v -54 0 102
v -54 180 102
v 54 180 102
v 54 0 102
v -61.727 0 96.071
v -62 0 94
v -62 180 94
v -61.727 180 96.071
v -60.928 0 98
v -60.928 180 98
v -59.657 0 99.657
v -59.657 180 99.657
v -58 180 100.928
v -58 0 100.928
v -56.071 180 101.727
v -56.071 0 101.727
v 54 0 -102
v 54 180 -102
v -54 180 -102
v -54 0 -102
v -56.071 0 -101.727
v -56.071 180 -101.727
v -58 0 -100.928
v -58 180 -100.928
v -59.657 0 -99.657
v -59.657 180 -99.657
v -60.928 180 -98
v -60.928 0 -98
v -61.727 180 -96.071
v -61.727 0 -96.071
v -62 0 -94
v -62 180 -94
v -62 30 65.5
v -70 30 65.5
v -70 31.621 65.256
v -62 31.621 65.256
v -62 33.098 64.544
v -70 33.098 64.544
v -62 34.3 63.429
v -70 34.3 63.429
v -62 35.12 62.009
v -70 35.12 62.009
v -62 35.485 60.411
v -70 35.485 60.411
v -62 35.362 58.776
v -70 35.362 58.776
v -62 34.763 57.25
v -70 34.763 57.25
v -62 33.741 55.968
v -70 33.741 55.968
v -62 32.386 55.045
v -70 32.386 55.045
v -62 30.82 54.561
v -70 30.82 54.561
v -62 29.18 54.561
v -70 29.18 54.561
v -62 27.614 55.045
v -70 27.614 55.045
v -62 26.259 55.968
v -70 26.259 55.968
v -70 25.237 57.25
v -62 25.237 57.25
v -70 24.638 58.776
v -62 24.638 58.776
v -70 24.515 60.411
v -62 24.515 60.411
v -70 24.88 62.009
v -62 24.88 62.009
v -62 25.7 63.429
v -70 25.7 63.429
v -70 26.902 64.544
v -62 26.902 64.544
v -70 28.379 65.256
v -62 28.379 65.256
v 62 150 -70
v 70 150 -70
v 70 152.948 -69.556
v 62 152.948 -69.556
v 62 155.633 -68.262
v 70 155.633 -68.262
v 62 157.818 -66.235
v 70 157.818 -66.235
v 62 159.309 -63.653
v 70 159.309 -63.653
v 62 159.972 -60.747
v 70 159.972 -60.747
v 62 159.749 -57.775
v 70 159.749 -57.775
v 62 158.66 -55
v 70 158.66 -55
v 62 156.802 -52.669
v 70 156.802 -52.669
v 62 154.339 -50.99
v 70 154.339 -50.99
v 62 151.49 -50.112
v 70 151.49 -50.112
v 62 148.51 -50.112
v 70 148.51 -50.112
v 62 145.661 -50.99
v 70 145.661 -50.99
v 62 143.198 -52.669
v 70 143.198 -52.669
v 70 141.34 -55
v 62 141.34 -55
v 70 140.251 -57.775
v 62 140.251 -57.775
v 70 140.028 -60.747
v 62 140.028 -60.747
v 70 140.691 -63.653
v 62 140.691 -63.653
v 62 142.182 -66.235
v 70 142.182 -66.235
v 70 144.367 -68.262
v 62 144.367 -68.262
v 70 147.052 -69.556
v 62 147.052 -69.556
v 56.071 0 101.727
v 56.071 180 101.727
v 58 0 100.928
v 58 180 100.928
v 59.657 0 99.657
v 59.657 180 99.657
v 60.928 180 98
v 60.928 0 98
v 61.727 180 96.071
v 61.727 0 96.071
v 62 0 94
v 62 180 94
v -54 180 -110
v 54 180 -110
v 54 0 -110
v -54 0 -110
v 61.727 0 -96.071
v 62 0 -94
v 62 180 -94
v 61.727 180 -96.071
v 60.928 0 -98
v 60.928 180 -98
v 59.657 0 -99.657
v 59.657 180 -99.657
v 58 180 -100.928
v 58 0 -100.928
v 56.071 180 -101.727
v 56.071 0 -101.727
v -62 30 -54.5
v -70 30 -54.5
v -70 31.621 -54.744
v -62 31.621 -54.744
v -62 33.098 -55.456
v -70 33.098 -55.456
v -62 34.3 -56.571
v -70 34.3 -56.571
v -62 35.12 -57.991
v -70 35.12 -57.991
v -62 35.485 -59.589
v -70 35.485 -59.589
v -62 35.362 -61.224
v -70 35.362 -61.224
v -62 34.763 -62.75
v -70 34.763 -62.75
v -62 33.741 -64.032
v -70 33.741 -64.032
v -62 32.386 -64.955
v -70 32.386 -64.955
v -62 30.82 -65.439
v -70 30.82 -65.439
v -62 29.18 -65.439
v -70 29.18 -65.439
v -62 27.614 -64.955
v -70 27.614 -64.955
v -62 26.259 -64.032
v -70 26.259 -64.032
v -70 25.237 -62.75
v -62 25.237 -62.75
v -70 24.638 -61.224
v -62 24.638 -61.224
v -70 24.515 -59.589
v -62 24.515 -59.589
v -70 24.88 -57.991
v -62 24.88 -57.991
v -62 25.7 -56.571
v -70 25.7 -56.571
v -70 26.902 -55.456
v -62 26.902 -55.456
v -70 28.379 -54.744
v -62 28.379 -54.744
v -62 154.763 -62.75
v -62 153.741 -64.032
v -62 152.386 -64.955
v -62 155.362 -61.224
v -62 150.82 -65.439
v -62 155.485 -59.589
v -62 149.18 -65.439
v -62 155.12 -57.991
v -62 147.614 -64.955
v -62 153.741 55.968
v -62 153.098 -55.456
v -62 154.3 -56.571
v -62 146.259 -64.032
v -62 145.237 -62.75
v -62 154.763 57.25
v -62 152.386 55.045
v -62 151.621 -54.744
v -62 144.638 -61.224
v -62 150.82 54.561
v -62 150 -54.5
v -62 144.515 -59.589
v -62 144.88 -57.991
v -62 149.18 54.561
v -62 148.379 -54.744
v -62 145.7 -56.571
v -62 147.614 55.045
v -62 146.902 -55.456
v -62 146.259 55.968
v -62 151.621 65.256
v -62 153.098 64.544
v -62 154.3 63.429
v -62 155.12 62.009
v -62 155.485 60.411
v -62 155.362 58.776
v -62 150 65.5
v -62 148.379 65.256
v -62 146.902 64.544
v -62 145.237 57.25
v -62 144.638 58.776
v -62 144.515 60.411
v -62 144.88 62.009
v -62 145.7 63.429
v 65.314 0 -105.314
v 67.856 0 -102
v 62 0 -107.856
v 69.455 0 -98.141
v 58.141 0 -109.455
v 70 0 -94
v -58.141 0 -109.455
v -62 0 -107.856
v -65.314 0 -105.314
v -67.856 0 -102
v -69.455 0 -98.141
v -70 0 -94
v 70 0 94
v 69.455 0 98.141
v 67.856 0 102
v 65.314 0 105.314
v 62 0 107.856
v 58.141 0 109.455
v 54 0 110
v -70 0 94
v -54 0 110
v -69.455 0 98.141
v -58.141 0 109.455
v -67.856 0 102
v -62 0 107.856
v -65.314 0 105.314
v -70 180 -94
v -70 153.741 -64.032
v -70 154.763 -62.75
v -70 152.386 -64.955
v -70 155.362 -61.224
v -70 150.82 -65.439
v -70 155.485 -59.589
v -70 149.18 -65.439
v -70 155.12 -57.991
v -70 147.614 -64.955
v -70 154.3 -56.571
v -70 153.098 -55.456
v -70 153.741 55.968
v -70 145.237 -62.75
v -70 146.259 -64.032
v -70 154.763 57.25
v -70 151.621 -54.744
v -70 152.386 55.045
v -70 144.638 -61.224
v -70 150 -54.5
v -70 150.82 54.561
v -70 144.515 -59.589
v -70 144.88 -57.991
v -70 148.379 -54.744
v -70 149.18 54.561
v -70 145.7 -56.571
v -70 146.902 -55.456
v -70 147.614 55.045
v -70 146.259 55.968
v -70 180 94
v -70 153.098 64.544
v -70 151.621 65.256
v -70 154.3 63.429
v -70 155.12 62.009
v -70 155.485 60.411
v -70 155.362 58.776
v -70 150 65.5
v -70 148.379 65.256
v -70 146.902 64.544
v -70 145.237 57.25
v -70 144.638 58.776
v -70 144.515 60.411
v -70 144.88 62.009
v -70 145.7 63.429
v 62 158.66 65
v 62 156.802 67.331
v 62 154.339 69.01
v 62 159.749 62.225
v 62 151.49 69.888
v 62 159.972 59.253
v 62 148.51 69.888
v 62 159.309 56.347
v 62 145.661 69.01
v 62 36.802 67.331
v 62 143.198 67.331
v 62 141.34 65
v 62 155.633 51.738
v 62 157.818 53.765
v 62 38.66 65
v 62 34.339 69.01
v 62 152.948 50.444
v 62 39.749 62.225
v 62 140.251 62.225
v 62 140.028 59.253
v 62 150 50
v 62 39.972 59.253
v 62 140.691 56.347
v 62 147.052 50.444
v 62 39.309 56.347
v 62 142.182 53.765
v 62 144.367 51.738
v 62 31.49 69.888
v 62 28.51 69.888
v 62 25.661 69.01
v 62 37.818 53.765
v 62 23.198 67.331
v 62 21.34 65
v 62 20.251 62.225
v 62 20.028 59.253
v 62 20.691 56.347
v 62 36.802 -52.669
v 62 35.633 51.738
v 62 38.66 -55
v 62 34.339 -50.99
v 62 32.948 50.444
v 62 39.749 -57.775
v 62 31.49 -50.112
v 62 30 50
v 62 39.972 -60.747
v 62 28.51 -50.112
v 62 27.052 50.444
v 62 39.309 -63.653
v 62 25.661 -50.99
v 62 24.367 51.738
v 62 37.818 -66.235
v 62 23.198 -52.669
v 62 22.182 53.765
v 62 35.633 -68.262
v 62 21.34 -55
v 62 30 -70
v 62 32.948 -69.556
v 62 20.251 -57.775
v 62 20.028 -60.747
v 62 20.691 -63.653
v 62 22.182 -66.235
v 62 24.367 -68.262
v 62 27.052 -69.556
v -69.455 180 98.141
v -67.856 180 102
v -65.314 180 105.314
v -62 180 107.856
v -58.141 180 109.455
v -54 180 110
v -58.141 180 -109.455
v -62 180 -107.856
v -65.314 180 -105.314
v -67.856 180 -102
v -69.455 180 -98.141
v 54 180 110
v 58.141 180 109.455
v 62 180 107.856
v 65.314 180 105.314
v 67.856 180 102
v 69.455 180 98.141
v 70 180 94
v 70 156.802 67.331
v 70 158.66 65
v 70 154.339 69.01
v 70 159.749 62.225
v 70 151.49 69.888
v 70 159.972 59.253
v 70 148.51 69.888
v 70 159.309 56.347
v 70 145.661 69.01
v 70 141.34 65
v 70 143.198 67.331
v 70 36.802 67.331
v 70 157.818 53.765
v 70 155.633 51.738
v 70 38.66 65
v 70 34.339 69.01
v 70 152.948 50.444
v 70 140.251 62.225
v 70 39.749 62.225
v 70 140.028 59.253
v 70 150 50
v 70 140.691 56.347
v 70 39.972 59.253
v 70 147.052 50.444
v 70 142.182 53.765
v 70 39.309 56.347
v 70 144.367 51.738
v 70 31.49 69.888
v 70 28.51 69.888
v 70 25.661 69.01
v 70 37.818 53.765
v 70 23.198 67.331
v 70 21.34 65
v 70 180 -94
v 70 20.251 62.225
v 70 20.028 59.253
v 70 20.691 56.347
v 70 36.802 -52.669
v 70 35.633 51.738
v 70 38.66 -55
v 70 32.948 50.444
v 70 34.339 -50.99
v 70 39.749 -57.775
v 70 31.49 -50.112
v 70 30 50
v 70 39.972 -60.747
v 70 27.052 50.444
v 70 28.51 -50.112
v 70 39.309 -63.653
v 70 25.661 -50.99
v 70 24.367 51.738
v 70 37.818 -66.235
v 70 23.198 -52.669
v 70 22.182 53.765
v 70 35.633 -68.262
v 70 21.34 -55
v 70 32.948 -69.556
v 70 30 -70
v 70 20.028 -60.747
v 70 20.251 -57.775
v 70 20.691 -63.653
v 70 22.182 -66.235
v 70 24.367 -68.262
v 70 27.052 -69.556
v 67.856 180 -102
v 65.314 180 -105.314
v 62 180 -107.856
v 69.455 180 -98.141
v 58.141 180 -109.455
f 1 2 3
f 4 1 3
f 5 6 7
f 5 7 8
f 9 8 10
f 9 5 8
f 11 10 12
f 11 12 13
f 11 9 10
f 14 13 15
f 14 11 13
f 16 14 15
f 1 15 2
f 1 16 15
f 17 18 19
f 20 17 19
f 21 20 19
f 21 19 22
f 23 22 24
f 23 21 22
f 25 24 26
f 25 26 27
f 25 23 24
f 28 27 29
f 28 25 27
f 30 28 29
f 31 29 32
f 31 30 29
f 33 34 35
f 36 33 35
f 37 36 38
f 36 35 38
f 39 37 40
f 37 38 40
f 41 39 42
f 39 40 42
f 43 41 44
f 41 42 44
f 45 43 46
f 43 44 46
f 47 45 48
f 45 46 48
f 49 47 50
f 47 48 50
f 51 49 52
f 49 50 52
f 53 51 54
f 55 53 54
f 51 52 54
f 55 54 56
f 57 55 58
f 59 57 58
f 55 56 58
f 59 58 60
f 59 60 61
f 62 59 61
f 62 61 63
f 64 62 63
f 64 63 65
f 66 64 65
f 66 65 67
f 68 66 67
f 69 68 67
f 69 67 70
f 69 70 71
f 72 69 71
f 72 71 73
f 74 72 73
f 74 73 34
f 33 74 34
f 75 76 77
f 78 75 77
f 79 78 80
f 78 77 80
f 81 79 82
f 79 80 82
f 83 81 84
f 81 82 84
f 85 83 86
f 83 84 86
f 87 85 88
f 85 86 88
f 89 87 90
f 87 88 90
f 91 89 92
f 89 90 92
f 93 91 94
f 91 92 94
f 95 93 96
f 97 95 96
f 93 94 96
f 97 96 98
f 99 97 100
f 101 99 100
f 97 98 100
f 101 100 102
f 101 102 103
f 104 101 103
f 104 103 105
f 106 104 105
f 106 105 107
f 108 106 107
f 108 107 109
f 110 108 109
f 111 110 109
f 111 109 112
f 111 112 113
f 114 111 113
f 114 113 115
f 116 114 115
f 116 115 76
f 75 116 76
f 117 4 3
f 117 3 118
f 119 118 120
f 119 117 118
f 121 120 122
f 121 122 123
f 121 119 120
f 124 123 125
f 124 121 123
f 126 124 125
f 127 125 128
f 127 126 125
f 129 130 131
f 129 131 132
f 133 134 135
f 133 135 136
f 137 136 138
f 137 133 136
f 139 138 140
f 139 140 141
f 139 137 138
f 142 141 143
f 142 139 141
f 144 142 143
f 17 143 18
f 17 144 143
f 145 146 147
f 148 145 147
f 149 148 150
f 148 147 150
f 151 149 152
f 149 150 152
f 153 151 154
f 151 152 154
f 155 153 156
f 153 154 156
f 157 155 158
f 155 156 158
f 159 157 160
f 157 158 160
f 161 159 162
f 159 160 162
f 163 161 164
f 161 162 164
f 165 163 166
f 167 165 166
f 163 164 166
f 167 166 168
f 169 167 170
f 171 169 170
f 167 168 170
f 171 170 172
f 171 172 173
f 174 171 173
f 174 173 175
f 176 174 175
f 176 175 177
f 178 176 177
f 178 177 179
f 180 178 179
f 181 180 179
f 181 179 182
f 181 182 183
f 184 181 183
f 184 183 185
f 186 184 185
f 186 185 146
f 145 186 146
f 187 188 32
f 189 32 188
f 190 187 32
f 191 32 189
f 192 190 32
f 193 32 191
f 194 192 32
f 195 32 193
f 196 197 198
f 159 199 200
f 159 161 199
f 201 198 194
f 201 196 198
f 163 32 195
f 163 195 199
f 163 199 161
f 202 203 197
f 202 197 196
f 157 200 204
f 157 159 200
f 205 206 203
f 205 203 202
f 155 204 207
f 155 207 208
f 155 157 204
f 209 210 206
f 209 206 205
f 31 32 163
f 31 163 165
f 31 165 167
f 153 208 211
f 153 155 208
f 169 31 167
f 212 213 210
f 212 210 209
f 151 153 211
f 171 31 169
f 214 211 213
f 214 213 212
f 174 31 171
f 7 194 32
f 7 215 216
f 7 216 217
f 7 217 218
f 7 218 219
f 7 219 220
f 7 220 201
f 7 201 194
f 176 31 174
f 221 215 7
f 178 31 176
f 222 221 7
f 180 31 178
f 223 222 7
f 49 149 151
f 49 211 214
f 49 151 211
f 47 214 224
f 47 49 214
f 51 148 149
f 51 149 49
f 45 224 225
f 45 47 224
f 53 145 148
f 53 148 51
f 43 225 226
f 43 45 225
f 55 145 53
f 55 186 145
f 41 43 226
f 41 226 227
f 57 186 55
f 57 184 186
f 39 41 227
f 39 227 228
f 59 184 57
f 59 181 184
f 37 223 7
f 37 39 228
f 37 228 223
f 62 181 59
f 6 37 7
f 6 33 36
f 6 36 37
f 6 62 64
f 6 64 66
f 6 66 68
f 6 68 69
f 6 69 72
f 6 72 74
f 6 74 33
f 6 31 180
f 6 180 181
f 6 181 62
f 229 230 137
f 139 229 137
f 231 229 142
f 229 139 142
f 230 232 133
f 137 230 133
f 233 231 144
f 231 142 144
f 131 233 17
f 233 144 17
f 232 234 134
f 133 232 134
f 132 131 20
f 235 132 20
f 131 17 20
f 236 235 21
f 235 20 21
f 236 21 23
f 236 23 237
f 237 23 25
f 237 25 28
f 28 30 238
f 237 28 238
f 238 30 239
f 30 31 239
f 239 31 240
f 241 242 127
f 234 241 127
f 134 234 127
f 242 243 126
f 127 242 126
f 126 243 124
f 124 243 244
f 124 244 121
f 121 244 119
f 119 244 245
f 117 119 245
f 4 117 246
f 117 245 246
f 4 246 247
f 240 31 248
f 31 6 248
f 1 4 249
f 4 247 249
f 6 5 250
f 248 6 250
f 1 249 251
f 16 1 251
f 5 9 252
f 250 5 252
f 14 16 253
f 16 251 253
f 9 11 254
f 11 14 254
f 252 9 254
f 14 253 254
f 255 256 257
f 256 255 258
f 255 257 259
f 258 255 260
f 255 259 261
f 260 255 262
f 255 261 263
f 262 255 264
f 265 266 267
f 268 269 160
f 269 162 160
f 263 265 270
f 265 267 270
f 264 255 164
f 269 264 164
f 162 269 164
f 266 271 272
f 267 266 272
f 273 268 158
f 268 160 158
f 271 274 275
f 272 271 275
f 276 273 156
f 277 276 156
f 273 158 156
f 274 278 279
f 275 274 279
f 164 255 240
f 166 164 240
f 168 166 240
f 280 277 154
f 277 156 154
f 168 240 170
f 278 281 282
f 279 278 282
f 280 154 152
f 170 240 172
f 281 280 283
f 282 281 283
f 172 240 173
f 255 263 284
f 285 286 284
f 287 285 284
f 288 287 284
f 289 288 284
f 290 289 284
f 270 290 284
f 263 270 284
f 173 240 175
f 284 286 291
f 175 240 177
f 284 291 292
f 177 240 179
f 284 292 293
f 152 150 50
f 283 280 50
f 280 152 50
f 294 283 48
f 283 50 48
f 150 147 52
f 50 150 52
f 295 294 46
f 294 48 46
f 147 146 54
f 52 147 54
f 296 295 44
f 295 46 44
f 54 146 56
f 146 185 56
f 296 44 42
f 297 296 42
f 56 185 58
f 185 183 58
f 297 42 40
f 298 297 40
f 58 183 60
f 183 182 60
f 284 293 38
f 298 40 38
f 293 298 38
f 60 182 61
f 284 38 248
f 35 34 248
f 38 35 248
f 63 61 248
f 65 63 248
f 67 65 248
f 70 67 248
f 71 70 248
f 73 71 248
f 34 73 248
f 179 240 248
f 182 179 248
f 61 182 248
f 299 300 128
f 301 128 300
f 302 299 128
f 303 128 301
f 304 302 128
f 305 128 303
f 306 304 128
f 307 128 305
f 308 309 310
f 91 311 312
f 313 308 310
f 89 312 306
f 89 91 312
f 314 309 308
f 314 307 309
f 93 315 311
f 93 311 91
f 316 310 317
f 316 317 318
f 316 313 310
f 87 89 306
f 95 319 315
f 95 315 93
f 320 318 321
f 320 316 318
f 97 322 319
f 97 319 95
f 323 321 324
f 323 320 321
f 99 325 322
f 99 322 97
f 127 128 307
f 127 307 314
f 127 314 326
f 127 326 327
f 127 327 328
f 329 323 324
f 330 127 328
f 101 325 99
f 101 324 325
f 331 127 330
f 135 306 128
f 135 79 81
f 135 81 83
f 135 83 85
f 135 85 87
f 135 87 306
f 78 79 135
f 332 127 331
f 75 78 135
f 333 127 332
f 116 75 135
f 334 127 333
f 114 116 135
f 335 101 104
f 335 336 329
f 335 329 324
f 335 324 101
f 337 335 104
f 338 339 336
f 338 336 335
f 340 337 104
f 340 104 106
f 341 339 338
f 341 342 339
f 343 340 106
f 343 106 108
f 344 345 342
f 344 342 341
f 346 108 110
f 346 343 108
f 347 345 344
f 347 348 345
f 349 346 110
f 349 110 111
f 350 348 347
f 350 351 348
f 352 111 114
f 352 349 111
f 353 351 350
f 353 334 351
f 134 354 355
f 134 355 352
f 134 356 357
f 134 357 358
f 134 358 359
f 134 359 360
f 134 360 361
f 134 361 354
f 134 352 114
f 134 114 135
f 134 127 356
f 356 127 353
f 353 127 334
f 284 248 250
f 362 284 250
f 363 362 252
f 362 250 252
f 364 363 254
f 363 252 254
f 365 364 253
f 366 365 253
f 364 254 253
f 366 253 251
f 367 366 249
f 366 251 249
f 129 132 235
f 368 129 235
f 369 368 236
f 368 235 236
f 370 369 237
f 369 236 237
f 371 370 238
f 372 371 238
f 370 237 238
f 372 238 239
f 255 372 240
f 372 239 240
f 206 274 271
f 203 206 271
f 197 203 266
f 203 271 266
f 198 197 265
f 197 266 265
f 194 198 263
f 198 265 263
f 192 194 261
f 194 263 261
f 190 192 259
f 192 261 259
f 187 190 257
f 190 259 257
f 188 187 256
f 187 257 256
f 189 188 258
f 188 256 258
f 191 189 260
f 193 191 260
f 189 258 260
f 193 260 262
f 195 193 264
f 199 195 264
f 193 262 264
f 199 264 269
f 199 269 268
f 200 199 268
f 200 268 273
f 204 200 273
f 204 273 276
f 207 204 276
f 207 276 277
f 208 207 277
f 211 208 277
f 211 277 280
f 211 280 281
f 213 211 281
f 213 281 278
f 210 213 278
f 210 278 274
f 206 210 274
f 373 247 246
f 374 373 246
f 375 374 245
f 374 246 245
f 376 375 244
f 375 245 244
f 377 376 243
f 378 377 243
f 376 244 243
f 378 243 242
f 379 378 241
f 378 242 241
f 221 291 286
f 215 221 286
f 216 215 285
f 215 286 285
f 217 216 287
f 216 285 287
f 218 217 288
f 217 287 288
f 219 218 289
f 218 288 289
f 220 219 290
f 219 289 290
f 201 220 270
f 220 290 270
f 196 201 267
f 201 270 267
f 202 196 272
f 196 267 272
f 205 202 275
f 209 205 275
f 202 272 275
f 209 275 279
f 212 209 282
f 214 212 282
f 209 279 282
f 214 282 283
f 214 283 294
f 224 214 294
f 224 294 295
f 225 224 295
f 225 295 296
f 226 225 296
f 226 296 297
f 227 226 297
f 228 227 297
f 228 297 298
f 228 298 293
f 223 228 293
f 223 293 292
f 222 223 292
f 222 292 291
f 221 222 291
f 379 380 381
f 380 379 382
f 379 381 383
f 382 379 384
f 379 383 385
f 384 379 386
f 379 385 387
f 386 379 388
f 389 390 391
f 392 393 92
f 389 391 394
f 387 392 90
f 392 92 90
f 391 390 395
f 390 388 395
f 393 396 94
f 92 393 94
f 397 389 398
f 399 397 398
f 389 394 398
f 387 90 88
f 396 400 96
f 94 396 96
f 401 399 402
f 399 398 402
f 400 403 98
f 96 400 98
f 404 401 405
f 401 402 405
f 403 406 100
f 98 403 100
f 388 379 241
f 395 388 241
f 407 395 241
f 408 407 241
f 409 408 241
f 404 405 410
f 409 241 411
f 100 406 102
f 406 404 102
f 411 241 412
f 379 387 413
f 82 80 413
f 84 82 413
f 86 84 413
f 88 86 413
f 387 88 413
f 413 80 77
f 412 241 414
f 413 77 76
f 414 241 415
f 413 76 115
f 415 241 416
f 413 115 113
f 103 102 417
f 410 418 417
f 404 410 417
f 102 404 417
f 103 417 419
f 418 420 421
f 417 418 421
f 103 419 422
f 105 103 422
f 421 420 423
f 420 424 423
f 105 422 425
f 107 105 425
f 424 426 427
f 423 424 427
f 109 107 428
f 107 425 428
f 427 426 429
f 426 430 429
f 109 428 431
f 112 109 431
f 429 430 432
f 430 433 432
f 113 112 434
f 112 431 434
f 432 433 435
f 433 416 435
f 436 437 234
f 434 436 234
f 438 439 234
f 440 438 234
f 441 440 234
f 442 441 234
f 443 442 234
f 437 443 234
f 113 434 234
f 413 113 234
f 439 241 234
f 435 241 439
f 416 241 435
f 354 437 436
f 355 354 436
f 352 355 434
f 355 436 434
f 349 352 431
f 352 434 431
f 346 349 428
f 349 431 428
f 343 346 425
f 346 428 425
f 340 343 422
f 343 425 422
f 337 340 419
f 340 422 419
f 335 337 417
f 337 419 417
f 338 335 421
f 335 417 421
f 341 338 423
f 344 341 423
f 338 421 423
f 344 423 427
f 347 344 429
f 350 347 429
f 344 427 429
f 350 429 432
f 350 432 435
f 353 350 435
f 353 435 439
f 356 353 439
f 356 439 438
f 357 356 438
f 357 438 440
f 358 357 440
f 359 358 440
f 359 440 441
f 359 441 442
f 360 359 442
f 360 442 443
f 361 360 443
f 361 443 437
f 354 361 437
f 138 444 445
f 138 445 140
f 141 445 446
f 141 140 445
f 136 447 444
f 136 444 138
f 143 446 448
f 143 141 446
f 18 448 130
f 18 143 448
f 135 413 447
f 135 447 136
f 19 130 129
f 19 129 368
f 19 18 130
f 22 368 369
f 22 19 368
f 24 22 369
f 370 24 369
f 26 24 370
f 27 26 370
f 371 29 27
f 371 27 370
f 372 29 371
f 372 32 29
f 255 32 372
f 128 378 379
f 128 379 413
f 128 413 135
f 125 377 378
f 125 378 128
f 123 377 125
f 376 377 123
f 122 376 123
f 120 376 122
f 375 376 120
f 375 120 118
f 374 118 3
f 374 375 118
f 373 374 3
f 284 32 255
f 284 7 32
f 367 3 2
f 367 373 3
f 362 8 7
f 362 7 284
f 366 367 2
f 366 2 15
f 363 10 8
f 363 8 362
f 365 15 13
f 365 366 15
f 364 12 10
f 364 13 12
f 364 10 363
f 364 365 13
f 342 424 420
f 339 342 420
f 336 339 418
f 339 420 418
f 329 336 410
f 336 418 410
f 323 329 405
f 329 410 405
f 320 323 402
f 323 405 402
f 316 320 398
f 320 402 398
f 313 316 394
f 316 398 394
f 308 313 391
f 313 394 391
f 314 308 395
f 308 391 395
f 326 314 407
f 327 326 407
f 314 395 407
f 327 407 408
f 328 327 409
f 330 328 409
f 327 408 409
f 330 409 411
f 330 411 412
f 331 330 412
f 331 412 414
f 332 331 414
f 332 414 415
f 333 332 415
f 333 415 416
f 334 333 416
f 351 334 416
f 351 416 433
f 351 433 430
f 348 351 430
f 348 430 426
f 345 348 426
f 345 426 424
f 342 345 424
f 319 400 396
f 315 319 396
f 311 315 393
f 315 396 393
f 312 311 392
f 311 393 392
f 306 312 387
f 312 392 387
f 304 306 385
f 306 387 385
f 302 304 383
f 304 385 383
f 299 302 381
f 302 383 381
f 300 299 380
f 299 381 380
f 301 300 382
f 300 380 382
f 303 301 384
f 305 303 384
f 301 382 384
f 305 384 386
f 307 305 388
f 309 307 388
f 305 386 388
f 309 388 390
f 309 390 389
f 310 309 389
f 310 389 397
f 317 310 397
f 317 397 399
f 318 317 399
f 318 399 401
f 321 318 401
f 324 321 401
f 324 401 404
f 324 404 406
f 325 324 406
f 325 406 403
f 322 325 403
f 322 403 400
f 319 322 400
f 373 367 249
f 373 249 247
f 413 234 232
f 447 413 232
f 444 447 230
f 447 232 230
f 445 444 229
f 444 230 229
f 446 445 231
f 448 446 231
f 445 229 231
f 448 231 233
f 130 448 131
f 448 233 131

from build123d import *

# Parameters (mm, degrees)
TUBE_RECTANGULAR_220_X_140_X_8_0_1_DEPTH = 180
SKETCH_5_R                               = 5.5
CUT_EXTRUDE_1_DEPTH                      = 10
SKETCH_6_R                               = 10
CUT_EXTRUDE_2_DEPTH                      = 10


with BuildPart() as part:
    # Sketch1 → Tube (rectangular) 220 X 140 X 8.0(1) (new body)
    with BuildSketch(Plane(origin=(0, 0, 0), x_dir=(-1, 0, 0), z_dir=(0, 1, 0))):
        with BuildLine():
            Line((-54, -110), (54, -110))
            ThreePointArc((54, -110), (65.313708499, -105.313708499), (70, -94))
            Line((70, -94), (70, 94))
            ThreePointArc((70, 94), (65.313708499, 105.313708499), (54, 110))
            Line((54, 110), (-54, 110))
            ThreePointArc((-54, 110), (-65.313708499, 105.313708499), (-70, 94))
            Line((-70, 94), (-70, -94))
            ThreePointArc((-70, -94), (-65.313708499, -105.313708499), (-54, -110))
        make_face()
        with BuildLine():
            Line((-54, -102), (54, -102))
            ThreePointArc((54, -102), (59.656854249, -99.656854249), (62, -94))
            Line((62, -94), (62, 94))
            ThreePointArc((62, 94), (59.656854249, 99.656854249), (54, 102))
            Line((54, 102), (-54, 102))
            ThreePointArc((-54, 102), (-59.656854249, 99.656854249), (-62, 94))
            Line((-62, 94), (-62, -94))
            ThreePointArc((-62, -94), (-59.656854249, -99.656854249), (-54, -102))
        make_face(mode=Mode.SUBTRACT)
    extrude(amount=TUBE_RECTANGULAR_220_X_140_X_8_0_1_DEPTH)

    # 草图5 → 切除-拉伸1 (cut)
    with BuildSketch(Plane.ZY.offset(70)):
        with Locations((-60, 30)):
            Circle(SKETCH_5_R)
        with Locations((60, 30)):
            Circle(SKETCH_5_R)
        with Locations((-60, 150)):
            Circle(SKETCH_5_R)
        with Locations((60, 150)):
            Circle(SKETCH_5_R)
    extrude(amount=-CUT_EXTRUDE_1_DEPTH, mode=Mode.SUBTRACT)

    # 草图6 → 切除-拉伸2 (cut)
    with BuildSketch(Plane(origin=(70, 0, 0), x_dir=(0, 0, -1), z_dir=(1, 0, 0))):
        with Locations((-60, 150)):
            Circle(SKETCH_6_R)
        with Locations((60, 150)):
            Circle(SKETCH_6_R)
        with Locations((-60, 30)):
            Circle(SKETCH_6_R)
        with Locations((60, 30)):
            Circle(SKETCH_6_R)
    extrude(amount=-CUT_EXTRUDE_2_DEPTH, mode=Mode.SUBTRACT)


solid = part.part
